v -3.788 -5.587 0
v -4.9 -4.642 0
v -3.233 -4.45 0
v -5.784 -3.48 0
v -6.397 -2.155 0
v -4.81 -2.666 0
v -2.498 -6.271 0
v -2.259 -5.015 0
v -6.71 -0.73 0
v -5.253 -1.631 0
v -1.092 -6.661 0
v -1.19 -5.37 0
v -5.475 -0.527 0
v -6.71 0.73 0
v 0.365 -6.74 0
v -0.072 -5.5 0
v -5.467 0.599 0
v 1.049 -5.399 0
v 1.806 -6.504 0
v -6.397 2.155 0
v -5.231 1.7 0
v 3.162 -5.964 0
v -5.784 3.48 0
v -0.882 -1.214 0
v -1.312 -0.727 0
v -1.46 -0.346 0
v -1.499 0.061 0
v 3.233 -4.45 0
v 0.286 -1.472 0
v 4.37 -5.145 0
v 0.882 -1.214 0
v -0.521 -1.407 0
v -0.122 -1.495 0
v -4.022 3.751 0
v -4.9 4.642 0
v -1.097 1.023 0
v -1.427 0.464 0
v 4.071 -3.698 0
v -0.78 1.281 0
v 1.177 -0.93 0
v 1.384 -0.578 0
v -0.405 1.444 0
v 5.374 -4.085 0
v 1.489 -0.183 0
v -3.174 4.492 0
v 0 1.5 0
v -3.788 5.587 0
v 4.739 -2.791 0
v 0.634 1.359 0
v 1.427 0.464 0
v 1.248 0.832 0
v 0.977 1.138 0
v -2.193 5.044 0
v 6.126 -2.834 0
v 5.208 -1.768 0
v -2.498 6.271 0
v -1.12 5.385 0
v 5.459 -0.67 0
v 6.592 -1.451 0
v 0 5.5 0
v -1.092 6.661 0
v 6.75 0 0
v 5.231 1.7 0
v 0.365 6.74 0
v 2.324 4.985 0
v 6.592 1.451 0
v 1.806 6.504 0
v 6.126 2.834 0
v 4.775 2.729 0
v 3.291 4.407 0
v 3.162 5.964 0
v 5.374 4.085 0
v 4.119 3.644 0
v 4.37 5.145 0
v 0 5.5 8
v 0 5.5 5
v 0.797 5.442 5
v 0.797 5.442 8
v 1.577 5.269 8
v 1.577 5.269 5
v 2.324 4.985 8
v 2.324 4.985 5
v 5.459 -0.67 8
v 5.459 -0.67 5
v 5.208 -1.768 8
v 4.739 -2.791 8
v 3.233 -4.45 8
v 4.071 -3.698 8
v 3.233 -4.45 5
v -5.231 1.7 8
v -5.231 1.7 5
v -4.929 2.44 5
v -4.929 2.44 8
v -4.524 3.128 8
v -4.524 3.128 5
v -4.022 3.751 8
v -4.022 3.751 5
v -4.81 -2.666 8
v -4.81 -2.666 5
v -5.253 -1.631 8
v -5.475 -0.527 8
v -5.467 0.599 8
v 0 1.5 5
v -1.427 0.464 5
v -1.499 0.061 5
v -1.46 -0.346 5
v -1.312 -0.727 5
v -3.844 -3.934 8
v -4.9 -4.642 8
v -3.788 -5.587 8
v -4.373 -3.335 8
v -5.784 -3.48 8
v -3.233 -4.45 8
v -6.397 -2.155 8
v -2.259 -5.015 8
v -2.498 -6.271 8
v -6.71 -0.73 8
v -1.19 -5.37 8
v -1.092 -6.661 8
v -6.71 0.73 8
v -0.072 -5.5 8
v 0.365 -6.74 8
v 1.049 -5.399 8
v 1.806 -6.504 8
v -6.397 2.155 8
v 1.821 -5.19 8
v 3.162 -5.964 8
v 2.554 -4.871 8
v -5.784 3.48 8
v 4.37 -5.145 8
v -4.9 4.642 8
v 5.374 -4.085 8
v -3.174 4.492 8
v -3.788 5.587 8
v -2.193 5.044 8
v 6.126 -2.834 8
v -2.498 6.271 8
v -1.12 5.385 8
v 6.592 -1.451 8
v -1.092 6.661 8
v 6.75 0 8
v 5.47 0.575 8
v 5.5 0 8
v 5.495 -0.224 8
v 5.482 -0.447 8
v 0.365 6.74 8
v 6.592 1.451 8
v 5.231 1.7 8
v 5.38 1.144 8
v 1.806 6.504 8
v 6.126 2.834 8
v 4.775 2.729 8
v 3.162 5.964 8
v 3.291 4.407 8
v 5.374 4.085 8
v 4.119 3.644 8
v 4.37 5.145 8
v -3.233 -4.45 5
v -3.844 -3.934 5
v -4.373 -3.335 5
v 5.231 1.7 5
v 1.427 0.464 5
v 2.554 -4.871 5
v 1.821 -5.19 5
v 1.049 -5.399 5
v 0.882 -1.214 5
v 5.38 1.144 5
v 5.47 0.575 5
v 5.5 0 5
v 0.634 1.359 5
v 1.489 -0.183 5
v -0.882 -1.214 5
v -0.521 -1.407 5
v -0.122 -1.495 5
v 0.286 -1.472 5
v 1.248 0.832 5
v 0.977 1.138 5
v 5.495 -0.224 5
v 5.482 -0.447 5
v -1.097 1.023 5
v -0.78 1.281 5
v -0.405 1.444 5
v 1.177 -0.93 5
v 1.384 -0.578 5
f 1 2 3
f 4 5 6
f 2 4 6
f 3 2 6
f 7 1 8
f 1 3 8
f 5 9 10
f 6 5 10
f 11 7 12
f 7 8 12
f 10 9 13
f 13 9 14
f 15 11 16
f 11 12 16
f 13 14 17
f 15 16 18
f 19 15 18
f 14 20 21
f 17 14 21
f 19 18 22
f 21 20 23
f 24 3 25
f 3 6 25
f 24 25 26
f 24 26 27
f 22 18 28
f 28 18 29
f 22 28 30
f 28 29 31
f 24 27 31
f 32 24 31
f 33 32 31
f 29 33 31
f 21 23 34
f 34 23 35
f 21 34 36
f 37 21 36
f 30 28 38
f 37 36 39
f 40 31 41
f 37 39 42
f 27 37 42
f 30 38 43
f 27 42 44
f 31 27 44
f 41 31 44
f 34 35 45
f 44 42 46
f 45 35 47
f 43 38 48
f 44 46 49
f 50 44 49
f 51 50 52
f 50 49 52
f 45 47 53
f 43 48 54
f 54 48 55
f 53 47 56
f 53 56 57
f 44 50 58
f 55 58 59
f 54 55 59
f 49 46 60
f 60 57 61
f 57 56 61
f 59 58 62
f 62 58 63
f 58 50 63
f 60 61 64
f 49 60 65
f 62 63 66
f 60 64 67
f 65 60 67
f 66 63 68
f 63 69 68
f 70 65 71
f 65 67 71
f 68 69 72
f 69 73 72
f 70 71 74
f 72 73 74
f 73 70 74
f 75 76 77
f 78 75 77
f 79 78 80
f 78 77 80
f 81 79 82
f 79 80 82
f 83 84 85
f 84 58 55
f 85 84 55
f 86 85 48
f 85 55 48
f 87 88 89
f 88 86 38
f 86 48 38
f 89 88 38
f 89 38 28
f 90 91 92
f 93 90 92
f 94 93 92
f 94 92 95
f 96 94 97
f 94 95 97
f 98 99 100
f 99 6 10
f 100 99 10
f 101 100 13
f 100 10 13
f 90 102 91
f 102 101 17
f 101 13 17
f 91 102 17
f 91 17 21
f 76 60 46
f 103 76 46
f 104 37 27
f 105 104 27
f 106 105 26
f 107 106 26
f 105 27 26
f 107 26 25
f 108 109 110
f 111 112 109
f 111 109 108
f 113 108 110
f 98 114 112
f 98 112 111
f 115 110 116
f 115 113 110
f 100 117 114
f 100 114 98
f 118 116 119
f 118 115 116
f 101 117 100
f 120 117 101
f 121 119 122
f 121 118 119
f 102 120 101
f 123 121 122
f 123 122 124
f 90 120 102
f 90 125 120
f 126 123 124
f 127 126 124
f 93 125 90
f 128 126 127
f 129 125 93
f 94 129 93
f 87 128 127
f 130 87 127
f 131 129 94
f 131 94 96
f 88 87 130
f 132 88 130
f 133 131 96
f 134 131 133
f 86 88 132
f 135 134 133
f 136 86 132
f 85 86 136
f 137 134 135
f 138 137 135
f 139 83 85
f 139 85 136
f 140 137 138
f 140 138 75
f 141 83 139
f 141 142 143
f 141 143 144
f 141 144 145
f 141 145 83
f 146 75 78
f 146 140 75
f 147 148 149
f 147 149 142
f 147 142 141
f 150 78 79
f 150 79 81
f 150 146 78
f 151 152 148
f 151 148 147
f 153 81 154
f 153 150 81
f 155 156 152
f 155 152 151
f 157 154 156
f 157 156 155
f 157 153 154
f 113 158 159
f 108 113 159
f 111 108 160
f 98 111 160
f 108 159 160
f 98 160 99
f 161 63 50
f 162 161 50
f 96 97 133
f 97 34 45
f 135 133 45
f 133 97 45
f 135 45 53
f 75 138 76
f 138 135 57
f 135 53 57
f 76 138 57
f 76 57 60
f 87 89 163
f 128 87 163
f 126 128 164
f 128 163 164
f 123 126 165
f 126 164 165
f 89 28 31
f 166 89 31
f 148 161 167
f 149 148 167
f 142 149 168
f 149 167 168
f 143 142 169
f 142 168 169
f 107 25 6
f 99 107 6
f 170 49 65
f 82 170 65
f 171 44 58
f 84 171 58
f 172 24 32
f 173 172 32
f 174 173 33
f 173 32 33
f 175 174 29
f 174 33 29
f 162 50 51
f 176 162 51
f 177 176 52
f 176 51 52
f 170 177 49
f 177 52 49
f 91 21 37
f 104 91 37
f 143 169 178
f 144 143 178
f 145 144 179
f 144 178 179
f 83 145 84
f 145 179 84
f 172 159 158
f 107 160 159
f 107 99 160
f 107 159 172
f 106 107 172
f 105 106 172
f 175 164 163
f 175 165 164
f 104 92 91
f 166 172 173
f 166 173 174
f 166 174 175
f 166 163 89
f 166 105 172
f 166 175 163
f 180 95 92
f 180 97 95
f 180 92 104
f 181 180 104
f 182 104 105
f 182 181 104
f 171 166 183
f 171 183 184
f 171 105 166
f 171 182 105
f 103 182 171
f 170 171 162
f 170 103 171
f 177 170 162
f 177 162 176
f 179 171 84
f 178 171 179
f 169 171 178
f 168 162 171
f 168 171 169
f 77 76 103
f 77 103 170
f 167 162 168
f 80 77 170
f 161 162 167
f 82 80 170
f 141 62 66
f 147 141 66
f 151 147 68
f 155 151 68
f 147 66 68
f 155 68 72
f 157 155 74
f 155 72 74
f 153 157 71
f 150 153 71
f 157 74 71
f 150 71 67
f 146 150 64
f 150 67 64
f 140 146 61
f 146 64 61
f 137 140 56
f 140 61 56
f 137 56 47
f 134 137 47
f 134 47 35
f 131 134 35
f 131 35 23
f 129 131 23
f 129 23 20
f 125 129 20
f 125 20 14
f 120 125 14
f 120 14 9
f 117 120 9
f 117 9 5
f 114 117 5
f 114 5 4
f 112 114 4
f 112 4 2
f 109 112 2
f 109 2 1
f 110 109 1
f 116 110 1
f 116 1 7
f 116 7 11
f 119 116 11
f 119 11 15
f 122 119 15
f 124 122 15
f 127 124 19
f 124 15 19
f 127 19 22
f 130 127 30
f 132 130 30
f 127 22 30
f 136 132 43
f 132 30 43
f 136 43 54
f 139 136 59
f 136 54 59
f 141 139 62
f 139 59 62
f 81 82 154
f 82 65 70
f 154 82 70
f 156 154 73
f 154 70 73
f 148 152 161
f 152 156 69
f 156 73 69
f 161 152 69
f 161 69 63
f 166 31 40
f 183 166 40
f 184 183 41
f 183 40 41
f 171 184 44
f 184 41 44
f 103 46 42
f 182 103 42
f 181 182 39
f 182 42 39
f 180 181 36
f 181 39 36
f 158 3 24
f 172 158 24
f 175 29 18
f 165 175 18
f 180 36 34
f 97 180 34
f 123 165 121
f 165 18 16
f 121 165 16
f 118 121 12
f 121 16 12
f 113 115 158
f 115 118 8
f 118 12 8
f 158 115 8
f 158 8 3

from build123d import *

# Parameters (mm, degrees)
F0_R     = 6.75
F1_DEPTH = 8
F2_DEPTH = 5


with BuildPart() as f1:
    # F0 (on Top) → F1 (new body)
    with BuildSketch(Plane.XY):
        Circle(F0_R)
        with BuildLine():
            ThreePointArc((5.230811, 1.699593), (5.432286, 0.86039), (5.5, 0))
            ThreePointArc((5.5, 0), (5.489741, -0.335767), (5.459004, -0.670281))
            ThreePointArc((5.459004, -0.670281), (4.73896, -2.791461), (3.232819, -4.449593))
            ThreePointArc((3.232819, -4.449593), (2.19312, -5.04383), (1.049449, -5.39895))
            ThreePointArc((1.049449, -5.39895), (-1.190418, -5.369628), (-3.232819, -4.449593))
            ThreePointArc((-3.232819, -4.449593), (-4.119256, -3.64441), (-4.810408, -2.666453))
            ThreePointArc((-4.810408, -2.666453), (-5.474679, -0.527152), (-5.230811, 1.699593))
            ThreePointArc((-5.230811, 1.699593), (-4.73896, 2.791461), (-4.022445, 3.750991))
            ThreePointArc((-4.022445, 3.750991), (-2.19312, 5.04383), (0, 5.5))
            ThreePointArc((0, 5.5), (1.190418, 5.369628), (2.3244, 4.984693))
            ThreePointArc((2.3244, 4.984693), (4.119256, 3.64441), (5.230811, 1.699593))
        make_face(mode=Mode.SUBTRACT)
    extrude(amount=F1_DEPTH)

    # F0 (on Top) → F2 (join)
    with BuildSketch(Plane.XY):
        Circle(F0_R)
        with BuildLine():
            ThreePointArc((5.230811, 1.699593), (5.432286, 0.86039), (5.5, 0))
            ThreePointArc((5.5, 0), (5.489741, -0.335767), (5.459004, -0.670281))
            ThreePointArc((5.459004, -0.670281), (4.73896, -2.791461), (3.232819, -4.449593))
            ThreePointArc((3.232819, -4.449593), (2.19312, -5.04383), (1.049449, -5.39895))
            ThreePointArc((1.049449, -5.39895), (-1.190418, -5.369628), (-3.232819, -4.449593))
            ThreePointArc((-3.232819, -4.449593), (-4.119256, -3.64441), (-4.810408, -2.666453))
            ThreePointArc((-4.810408, -2.666453), (-5.474679, -0.527152), (-5.230811, 1.699593))
            ThreePointArc((-5.230811, 1.699593), (-4.73896, 2.791461), (-4.022445, 3.750991))
            ThreePointArc((-4.022445, 3.750991), (-2.19312, 5.04383), (0, 5.5))
            ThreePointArc((0, 5.5), (1.190418, 5.369628), (2.3244, 4.984693))
            ThreePointArc((2.3244, 4.984693), (4.119256, 3.64441), (5.230811, 1.699593))
        make_face(mode=Mode.SUBTRACT)
        with BuildLine():
            Line((0.633927, 1.359462), (2.3244, 4.984693))
            ThreePointArc((2.3244, 4.984693), (1.190418, 5.369628), (0, 5.5))
            Line((0, 5.5), (0, 1.5))
            ThreePointArc((0, 1.5), (0.324659, 1.464444), (0.633927, 1.359462))
        make_face()
        with BuildLine():
            Line((-1.097031, 1.022998), (-4.022445, 3.750991))
            ThreePointArc((-4.022445, 3.750991), (-4.73896, 2.791461), (-5.230811, 1.699593))
            Line((-5.230811, 1.699593), (-1.426585, 0.463525))
            ThreePointArc((-1.426585, 0.463525), (-1.292444, 0.761308), (-1.097031, 1.022998))
        make_face()
        with BuildLine():
            ThreePointArc((-4.810408, -2.666453), (-4.119256, -3.64441), (-3.232819, -4.449593))
            Line((-3.232819, -4.449593), (-0.881678, -1.213525))
            ThreePointArc((-0.881678, -1.213525), (-1.123434, -0.99393), (-1.31193, -0.727214))
            Line((-1.31193, -0.727214), (-4.810408, -2.666453))
        make_face()
        with BuildLine():
            ThreePointArc((1.049449, -5.39895), (2.19312, -5.04383), (3.232819, -4.449593))
            Line((3.232819, -4.449593), (0.881678, -1.213525))
            ThreePointArc((0.881678, -1.213525), (0.598124, -1.37559), (0.286213, -1.472441))
            Line((0.286213, -1.472441), (1.049449, -5.39895))
        make_face()
        with BuildLine():
            ThreePointArc((5.459004, -0.670281), (5.489741, -0.335767), (5.5, 0))
            ThreePointArc((5.5, 0), (5.432286, 0.86039), (5.230811, 1.699593))
            Line((5.230811, 1.699593), (1.426585, 0.463525))
            ThreePointArc((1.426585, 0.463525), (1.481533, 0.234652), (1.5, 0))
            ThreePointArc((1.5, 0), (1.497202, -0.091573), (1.488819, -0.182804))
            Line((1.488819, -0.182804), (5.459004, -0.670281))
        make_face()
        with BuildLine():
            ThreePointArc((1.5, 0), (1.481533, 0.234652), (1.426585, 0.463525))
            ThreePointArc((1.426585, 0.463525), (1.123434, 0.99393), (0.633927, 1.359462))
            ThreePointArc((0.633927, 1.359462), (0.324659, 1.464444), (0, 1.5))
            ThreePointArc((0, 1.5), (-0.598124, 1.37559), (-1.097031, 1.022998))
            ThreePointArc((-1.097031, 1.022998), (-1.292444, 0.761308), (-1.426585, 0.463525))
            ThreePointArc((-1.426585, 0.463525), (-1.493094, -0.143769), (-1.31193, -0.727214))
            ThreePointArc((-1.31193, -0.727214), (-1.123434, -0.99393), (-0.881678, -1.213525))
            ThreePointArc((-0.881678, -1.213525), (-0.324659, -1.464444), (0.286213, -1.472441))
            ThreePointArc((0.286213, -1.472441), (0.598124, -1.37559), (0.881678, -1.213525))
            ThreePointArc((0.881678, -1.213525), (1.292444, -0.761308), (1.488819, -0.182804))
            ThreePointArc((1.488819, -0.182804), (1.497202, -0.091573), (1.5, 0))
        make_face()
    extrude(amount=F2_DEPTH)


solid = f1.part
